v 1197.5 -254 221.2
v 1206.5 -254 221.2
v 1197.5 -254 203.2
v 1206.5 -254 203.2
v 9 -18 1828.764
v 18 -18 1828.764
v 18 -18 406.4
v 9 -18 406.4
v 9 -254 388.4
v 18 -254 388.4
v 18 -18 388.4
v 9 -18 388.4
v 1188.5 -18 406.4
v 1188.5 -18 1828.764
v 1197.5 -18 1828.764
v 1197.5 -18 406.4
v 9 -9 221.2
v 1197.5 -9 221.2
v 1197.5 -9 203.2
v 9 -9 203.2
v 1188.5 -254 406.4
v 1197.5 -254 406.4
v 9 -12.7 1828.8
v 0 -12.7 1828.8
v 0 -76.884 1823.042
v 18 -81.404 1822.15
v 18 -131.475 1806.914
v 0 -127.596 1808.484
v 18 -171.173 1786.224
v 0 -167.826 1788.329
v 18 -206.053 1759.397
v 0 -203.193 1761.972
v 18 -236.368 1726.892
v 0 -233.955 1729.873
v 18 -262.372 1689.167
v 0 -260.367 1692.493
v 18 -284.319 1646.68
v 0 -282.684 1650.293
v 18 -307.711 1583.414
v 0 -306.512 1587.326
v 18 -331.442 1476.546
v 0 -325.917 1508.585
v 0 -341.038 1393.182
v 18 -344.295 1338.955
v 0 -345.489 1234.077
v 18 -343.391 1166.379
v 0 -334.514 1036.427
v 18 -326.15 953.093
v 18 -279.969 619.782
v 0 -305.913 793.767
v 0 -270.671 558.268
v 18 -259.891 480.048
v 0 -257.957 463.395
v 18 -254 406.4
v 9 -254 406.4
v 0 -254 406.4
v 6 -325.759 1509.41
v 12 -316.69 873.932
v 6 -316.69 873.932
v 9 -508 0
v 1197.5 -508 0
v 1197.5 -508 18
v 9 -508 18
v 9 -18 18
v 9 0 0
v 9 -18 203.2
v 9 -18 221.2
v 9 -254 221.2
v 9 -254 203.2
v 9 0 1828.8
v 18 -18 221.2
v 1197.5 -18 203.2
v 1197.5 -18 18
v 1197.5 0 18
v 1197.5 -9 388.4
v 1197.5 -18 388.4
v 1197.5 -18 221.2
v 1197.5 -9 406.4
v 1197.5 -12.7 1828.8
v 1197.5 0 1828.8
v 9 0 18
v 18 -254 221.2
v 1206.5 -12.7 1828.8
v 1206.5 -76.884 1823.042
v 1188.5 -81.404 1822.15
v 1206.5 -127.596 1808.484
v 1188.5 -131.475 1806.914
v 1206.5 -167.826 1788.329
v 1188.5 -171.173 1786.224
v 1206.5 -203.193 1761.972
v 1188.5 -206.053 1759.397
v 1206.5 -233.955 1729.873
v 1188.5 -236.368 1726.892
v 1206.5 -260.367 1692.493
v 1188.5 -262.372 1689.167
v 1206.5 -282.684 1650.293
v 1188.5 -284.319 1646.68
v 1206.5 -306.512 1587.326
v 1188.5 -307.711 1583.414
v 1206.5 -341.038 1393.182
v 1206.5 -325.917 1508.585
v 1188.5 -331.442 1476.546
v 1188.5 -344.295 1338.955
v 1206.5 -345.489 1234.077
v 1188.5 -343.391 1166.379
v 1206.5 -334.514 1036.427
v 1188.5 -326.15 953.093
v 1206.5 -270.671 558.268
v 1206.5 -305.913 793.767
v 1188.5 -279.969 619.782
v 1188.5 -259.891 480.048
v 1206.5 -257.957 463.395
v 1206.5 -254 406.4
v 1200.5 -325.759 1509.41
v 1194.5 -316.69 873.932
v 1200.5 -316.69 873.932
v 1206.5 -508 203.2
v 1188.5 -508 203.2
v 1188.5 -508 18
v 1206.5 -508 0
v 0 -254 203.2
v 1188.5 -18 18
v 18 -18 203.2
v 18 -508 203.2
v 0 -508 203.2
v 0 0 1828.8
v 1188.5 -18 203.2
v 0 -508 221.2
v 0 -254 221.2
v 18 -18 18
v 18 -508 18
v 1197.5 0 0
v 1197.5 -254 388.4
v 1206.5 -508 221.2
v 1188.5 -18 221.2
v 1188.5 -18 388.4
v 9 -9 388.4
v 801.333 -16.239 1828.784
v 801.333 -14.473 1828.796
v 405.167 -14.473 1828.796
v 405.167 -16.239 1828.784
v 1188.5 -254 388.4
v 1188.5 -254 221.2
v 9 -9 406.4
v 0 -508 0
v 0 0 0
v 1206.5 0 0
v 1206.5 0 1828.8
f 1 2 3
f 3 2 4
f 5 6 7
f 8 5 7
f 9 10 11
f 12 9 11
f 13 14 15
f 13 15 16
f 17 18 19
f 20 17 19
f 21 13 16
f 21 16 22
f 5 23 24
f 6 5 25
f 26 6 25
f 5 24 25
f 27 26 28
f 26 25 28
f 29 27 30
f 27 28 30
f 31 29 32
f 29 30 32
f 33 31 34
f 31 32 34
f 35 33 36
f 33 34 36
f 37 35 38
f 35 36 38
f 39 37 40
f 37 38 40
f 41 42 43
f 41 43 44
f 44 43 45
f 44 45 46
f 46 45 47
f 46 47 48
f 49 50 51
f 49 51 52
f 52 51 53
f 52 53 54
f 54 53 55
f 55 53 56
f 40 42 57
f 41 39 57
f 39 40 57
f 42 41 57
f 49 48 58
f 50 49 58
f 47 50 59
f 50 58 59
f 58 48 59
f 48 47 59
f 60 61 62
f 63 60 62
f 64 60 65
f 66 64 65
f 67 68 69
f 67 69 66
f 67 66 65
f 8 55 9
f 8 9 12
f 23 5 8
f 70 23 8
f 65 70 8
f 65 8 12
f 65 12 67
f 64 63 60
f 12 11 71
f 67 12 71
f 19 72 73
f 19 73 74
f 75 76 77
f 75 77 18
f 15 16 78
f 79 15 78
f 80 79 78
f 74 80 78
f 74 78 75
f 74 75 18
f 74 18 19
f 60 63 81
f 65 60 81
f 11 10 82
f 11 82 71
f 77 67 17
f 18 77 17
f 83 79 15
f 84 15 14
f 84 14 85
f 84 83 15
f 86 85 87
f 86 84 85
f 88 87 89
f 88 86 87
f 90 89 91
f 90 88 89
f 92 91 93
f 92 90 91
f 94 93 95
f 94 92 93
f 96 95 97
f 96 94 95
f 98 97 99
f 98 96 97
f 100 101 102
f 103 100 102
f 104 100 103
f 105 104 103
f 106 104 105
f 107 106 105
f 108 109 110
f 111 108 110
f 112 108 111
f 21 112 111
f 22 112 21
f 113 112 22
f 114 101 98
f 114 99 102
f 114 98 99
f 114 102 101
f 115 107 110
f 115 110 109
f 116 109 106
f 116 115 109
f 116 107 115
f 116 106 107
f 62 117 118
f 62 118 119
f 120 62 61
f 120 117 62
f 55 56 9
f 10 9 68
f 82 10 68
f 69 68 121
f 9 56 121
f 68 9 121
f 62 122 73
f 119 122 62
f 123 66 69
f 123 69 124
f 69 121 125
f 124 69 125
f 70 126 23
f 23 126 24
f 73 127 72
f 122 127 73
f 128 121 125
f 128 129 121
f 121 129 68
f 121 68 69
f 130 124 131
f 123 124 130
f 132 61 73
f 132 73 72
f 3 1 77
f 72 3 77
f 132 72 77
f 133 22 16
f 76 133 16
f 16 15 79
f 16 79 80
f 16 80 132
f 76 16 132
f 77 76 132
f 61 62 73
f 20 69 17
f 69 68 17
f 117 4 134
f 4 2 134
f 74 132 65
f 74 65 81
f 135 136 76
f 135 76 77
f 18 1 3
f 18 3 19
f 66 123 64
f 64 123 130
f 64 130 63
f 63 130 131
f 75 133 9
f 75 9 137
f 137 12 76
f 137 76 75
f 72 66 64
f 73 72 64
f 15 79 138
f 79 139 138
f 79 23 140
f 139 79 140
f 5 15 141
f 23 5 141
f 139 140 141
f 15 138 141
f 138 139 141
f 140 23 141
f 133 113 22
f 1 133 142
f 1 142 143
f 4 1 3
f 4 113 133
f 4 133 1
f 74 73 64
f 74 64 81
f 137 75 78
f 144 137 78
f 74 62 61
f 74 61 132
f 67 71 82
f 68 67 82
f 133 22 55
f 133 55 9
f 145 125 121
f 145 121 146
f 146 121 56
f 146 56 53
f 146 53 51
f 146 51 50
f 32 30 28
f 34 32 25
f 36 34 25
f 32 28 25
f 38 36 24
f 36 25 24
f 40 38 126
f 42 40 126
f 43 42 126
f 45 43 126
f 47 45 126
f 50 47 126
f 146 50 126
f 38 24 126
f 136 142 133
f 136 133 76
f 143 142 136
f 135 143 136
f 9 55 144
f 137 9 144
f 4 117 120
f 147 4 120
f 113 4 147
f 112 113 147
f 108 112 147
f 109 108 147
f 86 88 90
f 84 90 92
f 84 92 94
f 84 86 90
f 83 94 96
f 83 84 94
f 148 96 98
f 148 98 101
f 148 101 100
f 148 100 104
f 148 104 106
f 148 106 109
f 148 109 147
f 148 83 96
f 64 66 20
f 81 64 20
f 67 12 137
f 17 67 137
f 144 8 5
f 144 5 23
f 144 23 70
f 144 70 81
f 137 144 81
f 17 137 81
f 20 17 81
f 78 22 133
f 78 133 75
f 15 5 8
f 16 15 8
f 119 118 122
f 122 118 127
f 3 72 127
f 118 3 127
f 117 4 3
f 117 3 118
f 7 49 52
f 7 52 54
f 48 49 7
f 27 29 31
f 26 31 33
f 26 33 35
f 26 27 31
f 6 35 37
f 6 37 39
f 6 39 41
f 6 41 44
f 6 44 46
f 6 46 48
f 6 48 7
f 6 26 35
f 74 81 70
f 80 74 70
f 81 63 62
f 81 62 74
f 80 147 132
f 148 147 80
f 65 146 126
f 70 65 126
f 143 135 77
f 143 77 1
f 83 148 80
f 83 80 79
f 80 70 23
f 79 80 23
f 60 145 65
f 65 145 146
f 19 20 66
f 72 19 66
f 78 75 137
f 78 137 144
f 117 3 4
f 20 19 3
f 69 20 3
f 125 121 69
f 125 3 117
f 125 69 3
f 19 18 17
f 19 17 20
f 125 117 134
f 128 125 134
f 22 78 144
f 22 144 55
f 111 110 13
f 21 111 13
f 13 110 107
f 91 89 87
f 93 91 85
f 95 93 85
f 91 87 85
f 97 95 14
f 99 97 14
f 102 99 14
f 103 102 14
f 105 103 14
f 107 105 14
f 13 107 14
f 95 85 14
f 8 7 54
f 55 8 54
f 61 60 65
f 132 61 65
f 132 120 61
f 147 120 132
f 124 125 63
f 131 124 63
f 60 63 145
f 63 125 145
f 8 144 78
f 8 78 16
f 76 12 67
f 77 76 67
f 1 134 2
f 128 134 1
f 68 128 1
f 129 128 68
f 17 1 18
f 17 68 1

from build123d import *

# Parameters (mm, degrees)
F1_DEPTH  = 18
F3_DEPTH  = 9
F6_W      = 508
F6_H      = 18
F7_DEPTH  = 1188.5
F9_DEPTH  = 1188.5
F11_DEPTH = 1188.5
F14_DEPTH = 1206.5


with BuildPart() as f1:
    # F0 (on Right) → F1 (new body)
    with BuildSketch(Plane.YZ):
        with BuildLine():
            Line((-508, 0), (0, 0))
            Line((0, 0), (0, 1828.8))
            Line((0, 1828.8), (-12.7, 1828.8))
            add(Edge.make_bspline(
                [(-12.7, 1828.8), (-576.3234860751, 1828.8), (-254, 628.6125668436), (-254, 406.4)],
                knots=[0, 0, 0, 0, 1442.7222359138, 1442.7222359138, 1442.7222359138, 1442.7222359138], degree=3))
            Line((-254, 406.4), (-254, 203.2))
            Line((-254, 203.2), (-508, 203.2))
            Line((-508, 203.2), (-508, 0))
        make_face()
    extrude(amount=F1_DEPTH)

    # F2 (on face) → F3 (cut)
    with BuildSketch(Plane.YZ.offset(18)):
        with BuildLine():
            Line((0, 0), (0, 1828.8))
            Line((0, 1828.8), (-12.7, 1828.8))
            add(Edge.make_bspline(
                [(-12.7, 1828.8), (-14.4754451954, 1828.8), (-16.2420992729, 1828.7880907214), (-18, 1828.7643402483)],
                knots=[0, 0, 0, 0, 4.5446549432, 4.5446549432, 4.5446549432, 4.5446549432], degree=3))
            Line((-18, 1828.7643402483), (-18, 406.4))
            Line((-18, 406.4), (-254, 406.4))
            Line((-254, 406.4), (-254, 388.4))
            Line((-254, 388.4), (-18, 388.4))
            Line((-18, 388.4), (-18, 221.2))
            Line((-18, 221.2), (-254, 221.2))
            Line((-254, 221.2), (-254, 203.2))
            Line((-254, 203.2), (-18, 203.2))
            Line((-18, 203.2), (-18, 185.2))
            Line((-18, 185.2), (-18, 18))
            Line((-18, 18), (-508, 18))
            Line((-508, 18), (-508, 0))
            Line((-508, 0), (-19.05, 0))
            Line((-19.05, 0), (-18, 0))
            Line((-18, 0), (0, 0))
        make_face()
    extrude(amount=-F3_DEPTH, mode=Mode.SUBTRACT)


with BuildPart() as f5_1:
    # F5: instance of F1
    add(f1.part.mirror(Plane(origin=(603.25, -169.4224722203, 860.4731479353), x_dir=(0, 1, 0), z_dir=(-1, 0, 0))))


with BuildPart() as f7:
    # F6 (on face) → F7 (new body, through all)
    with BuildSketch(Plane.YZ.offset(9)):
        with Locations((-254, 9)):
            Rectangle(F6_W, F6_H)
    extrude(amount=F7_DEPTH)


with BuildPart() as f9:
    # F8 (on face) → F9 (new body, through all)
    with BuildSketch(Plane.YZ.offset(9)):
        with BuildLine():
            Line((0, 18), (0, 1828.8))
            Line((0, 1828.8), (-12.7, 1828.8))
            add(Edge.make_bspline(
                [(-12.7, 1828.8), (-14.4754451954, 1828.8), (-16.2420992729, 1828.7880907214), (-18, 1828.7643402483)],
                knots=[0, 0, 0, 0, 4.5446549432, 4.5446549432, 4.5446549432, 4.5446549432], degree=3))
            Line((-18, 1828.7643402483), (-18, 406.4))
            Line((-18, 406.4), (-18, 388.4))
            Line((-18, 388.4), (-18, 221.2))
            Line((-18, 221.2), (-18, 203.2))
            Line((-18, 203.2), (-18, 18))
            Line((-18, 18), (0, 18))
        make_face()
    extrude(amount=F9_DEPTH)


with BuildPart() as f11:
    # F10 (on face) → F11 (new body, through all)
    with BuildSketch(Plane.YZ.offset(9)):
        Polygon((-254, 406.4), (-254, 388.4), (-18, 388.4), (-9, 388.4), (-9, 406.4), (-18, 406.4), align=None)
    extrude(amount=F11_DEPTH)


with BuildPart() as f14:
    # F13 (on face) → F14 (new body, through all)
    with BuildSketch(Plane(origin=(0, 0, 0), x_dir=(0, -1, 0), z_dir=(-1, 0, 0))):
        Polygon((508, 203.2), (508, 221.2), (18, 221.2), (9, 221.2), (9, 203.2), (18, 203.2), align=None)
    extrude(amount=-F14_DEPTH)

    # F15: cut F1, F5_1
    add(f1.part, mode=Mode.SUBTRACT)
    add(f5_1.part, mode=Mode.SUBTRACT)


with BuildPart() as f9_1:
    add(f9.part)

    # F16: cut F11, F14
    add(f11.part, mode=Mode.SUBTRACT)
    add(f14.part, mode=Mode.SUBTRACT)


solid = Compound([f1.part, f5_1.part, f7.part, f11.part, f14.part, f9_1.part])
